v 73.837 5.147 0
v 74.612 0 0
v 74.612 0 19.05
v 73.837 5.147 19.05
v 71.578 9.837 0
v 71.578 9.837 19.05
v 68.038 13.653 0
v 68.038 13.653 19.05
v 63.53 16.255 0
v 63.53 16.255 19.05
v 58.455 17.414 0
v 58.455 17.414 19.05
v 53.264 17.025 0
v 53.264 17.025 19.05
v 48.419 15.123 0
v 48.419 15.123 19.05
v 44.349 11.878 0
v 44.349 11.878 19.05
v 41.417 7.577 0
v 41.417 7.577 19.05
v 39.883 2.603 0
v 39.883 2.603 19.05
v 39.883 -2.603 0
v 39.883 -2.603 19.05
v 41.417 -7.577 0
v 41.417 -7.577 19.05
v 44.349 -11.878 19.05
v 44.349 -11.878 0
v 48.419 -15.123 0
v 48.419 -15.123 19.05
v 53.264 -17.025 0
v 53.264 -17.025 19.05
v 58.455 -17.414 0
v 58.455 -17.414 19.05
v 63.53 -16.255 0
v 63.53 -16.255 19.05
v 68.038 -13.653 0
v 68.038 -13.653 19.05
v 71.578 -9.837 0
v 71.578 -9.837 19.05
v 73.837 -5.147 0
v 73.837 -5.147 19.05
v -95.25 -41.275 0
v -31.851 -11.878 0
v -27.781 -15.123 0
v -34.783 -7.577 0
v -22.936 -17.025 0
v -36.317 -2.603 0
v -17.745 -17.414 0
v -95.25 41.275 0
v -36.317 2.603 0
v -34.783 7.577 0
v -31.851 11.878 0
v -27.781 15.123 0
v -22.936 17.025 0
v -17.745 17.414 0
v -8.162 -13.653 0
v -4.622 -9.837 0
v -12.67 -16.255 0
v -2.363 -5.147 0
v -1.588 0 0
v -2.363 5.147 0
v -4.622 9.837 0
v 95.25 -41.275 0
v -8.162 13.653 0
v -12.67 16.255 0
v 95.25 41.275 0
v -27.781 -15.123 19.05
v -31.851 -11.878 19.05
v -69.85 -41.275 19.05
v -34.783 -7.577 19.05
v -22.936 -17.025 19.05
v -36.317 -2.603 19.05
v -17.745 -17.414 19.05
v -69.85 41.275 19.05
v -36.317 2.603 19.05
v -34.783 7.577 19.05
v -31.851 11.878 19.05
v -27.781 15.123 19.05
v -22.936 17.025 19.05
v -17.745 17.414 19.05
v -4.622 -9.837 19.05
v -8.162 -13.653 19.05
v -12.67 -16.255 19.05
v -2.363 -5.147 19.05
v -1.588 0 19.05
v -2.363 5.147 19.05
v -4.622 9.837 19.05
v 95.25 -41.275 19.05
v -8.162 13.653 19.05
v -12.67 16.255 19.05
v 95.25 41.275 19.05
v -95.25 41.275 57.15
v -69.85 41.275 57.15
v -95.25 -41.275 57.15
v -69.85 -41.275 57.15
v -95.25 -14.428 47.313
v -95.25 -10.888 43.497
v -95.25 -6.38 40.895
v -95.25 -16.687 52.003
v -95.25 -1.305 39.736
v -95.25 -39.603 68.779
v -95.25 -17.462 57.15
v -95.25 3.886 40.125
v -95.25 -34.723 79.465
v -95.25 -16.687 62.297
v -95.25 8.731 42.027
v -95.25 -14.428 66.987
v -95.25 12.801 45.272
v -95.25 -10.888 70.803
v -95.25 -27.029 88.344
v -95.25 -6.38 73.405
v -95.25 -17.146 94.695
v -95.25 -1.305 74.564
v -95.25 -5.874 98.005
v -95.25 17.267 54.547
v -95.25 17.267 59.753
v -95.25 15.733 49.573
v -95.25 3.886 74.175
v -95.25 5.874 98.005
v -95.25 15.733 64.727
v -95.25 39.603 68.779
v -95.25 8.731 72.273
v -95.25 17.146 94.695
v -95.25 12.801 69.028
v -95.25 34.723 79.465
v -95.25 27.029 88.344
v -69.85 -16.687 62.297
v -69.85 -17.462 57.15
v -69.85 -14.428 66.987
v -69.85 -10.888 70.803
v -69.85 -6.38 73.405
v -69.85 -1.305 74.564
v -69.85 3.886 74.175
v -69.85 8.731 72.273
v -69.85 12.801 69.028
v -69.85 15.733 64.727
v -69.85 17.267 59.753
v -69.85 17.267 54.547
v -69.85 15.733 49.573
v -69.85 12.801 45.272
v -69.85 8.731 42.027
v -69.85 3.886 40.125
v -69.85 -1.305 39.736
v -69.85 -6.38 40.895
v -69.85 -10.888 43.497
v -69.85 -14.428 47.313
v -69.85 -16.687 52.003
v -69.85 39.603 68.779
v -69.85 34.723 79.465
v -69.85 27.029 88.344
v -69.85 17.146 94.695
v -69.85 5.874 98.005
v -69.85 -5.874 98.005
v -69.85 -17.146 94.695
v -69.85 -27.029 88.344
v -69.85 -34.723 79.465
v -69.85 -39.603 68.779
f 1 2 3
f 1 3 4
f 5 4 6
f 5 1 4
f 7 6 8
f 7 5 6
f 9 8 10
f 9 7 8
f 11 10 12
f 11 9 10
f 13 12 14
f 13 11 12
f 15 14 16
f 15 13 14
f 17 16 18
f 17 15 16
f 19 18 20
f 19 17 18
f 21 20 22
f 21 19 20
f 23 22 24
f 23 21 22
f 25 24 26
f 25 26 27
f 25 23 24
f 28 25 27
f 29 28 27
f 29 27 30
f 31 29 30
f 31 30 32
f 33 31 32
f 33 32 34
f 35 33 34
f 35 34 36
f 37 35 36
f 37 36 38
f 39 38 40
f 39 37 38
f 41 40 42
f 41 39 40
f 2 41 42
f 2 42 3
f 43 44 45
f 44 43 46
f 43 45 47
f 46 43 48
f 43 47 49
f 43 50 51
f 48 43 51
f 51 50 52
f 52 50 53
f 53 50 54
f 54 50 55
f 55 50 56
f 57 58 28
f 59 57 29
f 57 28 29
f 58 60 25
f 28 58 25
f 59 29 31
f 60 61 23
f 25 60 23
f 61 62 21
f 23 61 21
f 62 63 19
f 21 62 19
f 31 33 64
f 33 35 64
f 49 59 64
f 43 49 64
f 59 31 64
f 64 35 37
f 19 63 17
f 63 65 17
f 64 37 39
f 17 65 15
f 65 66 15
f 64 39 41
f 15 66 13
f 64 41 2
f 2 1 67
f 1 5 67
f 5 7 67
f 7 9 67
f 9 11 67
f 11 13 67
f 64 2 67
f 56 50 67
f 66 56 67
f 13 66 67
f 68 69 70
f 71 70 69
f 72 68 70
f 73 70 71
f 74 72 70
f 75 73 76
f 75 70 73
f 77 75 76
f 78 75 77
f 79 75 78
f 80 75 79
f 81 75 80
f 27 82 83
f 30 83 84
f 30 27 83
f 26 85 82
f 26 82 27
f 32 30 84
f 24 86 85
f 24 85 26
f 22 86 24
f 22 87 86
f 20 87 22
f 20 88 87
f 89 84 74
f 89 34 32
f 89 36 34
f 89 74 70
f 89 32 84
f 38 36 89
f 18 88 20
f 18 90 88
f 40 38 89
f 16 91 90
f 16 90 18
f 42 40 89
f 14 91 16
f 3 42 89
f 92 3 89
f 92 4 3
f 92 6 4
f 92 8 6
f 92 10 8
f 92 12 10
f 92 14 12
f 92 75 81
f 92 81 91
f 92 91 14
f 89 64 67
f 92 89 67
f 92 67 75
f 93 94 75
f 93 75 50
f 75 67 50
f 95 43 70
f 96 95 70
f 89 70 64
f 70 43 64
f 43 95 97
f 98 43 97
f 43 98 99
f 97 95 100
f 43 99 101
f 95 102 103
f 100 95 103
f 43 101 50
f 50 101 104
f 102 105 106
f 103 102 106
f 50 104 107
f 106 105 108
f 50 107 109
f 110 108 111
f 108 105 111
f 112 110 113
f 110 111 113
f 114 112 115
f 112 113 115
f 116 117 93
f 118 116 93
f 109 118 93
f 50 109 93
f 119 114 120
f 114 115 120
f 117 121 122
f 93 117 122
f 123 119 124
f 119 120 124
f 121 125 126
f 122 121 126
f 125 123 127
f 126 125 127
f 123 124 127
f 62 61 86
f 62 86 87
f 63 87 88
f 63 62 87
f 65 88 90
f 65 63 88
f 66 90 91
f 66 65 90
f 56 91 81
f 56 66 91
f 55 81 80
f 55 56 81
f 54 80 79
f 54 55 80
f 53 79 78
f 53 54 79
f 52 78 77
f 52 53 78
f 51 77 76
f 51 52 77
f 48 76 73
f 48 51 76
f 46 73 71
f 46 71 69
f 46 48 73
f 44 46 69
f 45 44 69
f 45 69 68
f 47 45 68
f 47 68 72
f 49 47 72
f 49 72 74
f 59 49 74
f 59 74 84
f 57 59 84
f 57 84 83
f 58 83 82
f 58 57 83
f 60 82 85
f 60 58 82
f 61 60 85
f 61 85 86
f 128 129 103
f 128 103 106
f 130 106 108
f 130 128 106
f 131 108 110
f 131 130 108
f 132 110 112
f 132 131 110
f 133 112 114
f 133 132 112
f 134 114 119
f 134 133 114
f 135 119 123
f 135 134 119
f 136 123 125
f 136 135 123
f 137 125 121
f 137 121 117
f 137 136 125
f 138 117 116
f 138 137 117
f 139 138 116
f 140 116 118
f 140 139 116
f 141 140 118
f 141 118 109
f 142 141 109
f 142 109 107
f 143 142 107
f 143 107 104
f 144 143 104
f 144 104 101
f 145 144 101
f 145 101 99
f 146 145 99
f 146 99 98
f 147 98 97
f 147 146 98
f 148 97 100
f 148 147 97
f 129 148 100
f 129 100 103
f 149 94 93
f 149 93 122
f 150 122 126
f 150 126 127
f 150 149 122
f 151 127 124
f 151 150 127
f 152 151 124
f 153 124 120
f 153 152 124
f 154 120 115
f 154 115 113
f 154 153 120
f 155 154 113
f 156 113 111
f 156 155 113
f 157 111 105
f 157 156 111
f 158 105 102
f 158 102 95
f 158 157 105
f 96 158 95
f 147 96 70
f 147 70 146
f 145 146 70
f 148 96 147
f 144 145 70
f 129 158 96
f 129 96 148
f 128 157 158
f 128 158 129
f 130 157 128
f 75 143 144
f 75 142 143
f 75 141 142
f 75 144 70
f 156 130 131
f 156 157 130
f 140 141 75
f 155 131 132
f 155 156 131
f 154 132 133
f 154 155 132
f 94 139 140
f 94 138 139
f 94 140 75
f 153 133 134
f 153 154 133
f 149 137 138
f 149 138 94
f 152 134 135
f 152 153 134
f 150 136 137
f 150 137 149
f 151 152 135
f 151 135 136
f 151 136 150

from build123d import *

# Parameters (mm, degrees)
F0_W     = 165.1
F0_H     = 82.55
F0_R     = 17.4625
F0_W_2   = 25.4
F1_DEPTH = 19.05
F2_DEPTH = 57.15
F4_DEPTH = 25.4
F3_R     = 17.4625
F5_DEPTH = 25.4


with BuildPart() as f1:
    # F0 (on Top) → F1 (new body)
    with BuildSketch(Plane.XY):
        with Locations((12.7, 0)):
            Rectangle(F0_W, F0_H)
        with Locations((-19.05, 0)):
            Circle(F0_R, mode=Mode.SUBTRACT)
        with Locations((57.15, 0)):
            Circle(F0_R, mode=Mode.SUBTRACT)
        with Locations((-82.55, 0)):
            Rectangle(F0_W_2, F0_H)
    extrude(amount=F1_DEPTH)

    # F0 (on Top) → F2 (join)
    with BuildSketch(Plane.XY):
        with Locations((-82.55, 0)):
            Rectangle(F0_W_2, F0_H)
    extrude(amount=F2_DEPTH)

    # F3 (on face) → F4 (join)
    with BuildSketch(Plane.YZ.offset(-69.85)):
        with BuildLine():
            ThreePointArc((-17.4625, 57.15), (0, 74.6125), (17.4625, 57.15))
            Line((17.4625, 57.15), (41.275, 57.15))
            ThreePointArc((41.275, 57.15), (0, 98.425), (-41.275, 57.15))
            Line((-41.275, 57.15), (-17.4625, 57.15))
        make_face()
    extrude(amount=-F4_DEPTH)

    # F3 (on face) → F5 (cut)
    with BuildSketch(Plane.YZ.offset(-69.85)):
        with Locations((0, 57.15)):
            Circle(F3_R)
    extrude(amount=-F5_DEPTH, mode=Mode.SUBTRACT)


solid = f1.part
